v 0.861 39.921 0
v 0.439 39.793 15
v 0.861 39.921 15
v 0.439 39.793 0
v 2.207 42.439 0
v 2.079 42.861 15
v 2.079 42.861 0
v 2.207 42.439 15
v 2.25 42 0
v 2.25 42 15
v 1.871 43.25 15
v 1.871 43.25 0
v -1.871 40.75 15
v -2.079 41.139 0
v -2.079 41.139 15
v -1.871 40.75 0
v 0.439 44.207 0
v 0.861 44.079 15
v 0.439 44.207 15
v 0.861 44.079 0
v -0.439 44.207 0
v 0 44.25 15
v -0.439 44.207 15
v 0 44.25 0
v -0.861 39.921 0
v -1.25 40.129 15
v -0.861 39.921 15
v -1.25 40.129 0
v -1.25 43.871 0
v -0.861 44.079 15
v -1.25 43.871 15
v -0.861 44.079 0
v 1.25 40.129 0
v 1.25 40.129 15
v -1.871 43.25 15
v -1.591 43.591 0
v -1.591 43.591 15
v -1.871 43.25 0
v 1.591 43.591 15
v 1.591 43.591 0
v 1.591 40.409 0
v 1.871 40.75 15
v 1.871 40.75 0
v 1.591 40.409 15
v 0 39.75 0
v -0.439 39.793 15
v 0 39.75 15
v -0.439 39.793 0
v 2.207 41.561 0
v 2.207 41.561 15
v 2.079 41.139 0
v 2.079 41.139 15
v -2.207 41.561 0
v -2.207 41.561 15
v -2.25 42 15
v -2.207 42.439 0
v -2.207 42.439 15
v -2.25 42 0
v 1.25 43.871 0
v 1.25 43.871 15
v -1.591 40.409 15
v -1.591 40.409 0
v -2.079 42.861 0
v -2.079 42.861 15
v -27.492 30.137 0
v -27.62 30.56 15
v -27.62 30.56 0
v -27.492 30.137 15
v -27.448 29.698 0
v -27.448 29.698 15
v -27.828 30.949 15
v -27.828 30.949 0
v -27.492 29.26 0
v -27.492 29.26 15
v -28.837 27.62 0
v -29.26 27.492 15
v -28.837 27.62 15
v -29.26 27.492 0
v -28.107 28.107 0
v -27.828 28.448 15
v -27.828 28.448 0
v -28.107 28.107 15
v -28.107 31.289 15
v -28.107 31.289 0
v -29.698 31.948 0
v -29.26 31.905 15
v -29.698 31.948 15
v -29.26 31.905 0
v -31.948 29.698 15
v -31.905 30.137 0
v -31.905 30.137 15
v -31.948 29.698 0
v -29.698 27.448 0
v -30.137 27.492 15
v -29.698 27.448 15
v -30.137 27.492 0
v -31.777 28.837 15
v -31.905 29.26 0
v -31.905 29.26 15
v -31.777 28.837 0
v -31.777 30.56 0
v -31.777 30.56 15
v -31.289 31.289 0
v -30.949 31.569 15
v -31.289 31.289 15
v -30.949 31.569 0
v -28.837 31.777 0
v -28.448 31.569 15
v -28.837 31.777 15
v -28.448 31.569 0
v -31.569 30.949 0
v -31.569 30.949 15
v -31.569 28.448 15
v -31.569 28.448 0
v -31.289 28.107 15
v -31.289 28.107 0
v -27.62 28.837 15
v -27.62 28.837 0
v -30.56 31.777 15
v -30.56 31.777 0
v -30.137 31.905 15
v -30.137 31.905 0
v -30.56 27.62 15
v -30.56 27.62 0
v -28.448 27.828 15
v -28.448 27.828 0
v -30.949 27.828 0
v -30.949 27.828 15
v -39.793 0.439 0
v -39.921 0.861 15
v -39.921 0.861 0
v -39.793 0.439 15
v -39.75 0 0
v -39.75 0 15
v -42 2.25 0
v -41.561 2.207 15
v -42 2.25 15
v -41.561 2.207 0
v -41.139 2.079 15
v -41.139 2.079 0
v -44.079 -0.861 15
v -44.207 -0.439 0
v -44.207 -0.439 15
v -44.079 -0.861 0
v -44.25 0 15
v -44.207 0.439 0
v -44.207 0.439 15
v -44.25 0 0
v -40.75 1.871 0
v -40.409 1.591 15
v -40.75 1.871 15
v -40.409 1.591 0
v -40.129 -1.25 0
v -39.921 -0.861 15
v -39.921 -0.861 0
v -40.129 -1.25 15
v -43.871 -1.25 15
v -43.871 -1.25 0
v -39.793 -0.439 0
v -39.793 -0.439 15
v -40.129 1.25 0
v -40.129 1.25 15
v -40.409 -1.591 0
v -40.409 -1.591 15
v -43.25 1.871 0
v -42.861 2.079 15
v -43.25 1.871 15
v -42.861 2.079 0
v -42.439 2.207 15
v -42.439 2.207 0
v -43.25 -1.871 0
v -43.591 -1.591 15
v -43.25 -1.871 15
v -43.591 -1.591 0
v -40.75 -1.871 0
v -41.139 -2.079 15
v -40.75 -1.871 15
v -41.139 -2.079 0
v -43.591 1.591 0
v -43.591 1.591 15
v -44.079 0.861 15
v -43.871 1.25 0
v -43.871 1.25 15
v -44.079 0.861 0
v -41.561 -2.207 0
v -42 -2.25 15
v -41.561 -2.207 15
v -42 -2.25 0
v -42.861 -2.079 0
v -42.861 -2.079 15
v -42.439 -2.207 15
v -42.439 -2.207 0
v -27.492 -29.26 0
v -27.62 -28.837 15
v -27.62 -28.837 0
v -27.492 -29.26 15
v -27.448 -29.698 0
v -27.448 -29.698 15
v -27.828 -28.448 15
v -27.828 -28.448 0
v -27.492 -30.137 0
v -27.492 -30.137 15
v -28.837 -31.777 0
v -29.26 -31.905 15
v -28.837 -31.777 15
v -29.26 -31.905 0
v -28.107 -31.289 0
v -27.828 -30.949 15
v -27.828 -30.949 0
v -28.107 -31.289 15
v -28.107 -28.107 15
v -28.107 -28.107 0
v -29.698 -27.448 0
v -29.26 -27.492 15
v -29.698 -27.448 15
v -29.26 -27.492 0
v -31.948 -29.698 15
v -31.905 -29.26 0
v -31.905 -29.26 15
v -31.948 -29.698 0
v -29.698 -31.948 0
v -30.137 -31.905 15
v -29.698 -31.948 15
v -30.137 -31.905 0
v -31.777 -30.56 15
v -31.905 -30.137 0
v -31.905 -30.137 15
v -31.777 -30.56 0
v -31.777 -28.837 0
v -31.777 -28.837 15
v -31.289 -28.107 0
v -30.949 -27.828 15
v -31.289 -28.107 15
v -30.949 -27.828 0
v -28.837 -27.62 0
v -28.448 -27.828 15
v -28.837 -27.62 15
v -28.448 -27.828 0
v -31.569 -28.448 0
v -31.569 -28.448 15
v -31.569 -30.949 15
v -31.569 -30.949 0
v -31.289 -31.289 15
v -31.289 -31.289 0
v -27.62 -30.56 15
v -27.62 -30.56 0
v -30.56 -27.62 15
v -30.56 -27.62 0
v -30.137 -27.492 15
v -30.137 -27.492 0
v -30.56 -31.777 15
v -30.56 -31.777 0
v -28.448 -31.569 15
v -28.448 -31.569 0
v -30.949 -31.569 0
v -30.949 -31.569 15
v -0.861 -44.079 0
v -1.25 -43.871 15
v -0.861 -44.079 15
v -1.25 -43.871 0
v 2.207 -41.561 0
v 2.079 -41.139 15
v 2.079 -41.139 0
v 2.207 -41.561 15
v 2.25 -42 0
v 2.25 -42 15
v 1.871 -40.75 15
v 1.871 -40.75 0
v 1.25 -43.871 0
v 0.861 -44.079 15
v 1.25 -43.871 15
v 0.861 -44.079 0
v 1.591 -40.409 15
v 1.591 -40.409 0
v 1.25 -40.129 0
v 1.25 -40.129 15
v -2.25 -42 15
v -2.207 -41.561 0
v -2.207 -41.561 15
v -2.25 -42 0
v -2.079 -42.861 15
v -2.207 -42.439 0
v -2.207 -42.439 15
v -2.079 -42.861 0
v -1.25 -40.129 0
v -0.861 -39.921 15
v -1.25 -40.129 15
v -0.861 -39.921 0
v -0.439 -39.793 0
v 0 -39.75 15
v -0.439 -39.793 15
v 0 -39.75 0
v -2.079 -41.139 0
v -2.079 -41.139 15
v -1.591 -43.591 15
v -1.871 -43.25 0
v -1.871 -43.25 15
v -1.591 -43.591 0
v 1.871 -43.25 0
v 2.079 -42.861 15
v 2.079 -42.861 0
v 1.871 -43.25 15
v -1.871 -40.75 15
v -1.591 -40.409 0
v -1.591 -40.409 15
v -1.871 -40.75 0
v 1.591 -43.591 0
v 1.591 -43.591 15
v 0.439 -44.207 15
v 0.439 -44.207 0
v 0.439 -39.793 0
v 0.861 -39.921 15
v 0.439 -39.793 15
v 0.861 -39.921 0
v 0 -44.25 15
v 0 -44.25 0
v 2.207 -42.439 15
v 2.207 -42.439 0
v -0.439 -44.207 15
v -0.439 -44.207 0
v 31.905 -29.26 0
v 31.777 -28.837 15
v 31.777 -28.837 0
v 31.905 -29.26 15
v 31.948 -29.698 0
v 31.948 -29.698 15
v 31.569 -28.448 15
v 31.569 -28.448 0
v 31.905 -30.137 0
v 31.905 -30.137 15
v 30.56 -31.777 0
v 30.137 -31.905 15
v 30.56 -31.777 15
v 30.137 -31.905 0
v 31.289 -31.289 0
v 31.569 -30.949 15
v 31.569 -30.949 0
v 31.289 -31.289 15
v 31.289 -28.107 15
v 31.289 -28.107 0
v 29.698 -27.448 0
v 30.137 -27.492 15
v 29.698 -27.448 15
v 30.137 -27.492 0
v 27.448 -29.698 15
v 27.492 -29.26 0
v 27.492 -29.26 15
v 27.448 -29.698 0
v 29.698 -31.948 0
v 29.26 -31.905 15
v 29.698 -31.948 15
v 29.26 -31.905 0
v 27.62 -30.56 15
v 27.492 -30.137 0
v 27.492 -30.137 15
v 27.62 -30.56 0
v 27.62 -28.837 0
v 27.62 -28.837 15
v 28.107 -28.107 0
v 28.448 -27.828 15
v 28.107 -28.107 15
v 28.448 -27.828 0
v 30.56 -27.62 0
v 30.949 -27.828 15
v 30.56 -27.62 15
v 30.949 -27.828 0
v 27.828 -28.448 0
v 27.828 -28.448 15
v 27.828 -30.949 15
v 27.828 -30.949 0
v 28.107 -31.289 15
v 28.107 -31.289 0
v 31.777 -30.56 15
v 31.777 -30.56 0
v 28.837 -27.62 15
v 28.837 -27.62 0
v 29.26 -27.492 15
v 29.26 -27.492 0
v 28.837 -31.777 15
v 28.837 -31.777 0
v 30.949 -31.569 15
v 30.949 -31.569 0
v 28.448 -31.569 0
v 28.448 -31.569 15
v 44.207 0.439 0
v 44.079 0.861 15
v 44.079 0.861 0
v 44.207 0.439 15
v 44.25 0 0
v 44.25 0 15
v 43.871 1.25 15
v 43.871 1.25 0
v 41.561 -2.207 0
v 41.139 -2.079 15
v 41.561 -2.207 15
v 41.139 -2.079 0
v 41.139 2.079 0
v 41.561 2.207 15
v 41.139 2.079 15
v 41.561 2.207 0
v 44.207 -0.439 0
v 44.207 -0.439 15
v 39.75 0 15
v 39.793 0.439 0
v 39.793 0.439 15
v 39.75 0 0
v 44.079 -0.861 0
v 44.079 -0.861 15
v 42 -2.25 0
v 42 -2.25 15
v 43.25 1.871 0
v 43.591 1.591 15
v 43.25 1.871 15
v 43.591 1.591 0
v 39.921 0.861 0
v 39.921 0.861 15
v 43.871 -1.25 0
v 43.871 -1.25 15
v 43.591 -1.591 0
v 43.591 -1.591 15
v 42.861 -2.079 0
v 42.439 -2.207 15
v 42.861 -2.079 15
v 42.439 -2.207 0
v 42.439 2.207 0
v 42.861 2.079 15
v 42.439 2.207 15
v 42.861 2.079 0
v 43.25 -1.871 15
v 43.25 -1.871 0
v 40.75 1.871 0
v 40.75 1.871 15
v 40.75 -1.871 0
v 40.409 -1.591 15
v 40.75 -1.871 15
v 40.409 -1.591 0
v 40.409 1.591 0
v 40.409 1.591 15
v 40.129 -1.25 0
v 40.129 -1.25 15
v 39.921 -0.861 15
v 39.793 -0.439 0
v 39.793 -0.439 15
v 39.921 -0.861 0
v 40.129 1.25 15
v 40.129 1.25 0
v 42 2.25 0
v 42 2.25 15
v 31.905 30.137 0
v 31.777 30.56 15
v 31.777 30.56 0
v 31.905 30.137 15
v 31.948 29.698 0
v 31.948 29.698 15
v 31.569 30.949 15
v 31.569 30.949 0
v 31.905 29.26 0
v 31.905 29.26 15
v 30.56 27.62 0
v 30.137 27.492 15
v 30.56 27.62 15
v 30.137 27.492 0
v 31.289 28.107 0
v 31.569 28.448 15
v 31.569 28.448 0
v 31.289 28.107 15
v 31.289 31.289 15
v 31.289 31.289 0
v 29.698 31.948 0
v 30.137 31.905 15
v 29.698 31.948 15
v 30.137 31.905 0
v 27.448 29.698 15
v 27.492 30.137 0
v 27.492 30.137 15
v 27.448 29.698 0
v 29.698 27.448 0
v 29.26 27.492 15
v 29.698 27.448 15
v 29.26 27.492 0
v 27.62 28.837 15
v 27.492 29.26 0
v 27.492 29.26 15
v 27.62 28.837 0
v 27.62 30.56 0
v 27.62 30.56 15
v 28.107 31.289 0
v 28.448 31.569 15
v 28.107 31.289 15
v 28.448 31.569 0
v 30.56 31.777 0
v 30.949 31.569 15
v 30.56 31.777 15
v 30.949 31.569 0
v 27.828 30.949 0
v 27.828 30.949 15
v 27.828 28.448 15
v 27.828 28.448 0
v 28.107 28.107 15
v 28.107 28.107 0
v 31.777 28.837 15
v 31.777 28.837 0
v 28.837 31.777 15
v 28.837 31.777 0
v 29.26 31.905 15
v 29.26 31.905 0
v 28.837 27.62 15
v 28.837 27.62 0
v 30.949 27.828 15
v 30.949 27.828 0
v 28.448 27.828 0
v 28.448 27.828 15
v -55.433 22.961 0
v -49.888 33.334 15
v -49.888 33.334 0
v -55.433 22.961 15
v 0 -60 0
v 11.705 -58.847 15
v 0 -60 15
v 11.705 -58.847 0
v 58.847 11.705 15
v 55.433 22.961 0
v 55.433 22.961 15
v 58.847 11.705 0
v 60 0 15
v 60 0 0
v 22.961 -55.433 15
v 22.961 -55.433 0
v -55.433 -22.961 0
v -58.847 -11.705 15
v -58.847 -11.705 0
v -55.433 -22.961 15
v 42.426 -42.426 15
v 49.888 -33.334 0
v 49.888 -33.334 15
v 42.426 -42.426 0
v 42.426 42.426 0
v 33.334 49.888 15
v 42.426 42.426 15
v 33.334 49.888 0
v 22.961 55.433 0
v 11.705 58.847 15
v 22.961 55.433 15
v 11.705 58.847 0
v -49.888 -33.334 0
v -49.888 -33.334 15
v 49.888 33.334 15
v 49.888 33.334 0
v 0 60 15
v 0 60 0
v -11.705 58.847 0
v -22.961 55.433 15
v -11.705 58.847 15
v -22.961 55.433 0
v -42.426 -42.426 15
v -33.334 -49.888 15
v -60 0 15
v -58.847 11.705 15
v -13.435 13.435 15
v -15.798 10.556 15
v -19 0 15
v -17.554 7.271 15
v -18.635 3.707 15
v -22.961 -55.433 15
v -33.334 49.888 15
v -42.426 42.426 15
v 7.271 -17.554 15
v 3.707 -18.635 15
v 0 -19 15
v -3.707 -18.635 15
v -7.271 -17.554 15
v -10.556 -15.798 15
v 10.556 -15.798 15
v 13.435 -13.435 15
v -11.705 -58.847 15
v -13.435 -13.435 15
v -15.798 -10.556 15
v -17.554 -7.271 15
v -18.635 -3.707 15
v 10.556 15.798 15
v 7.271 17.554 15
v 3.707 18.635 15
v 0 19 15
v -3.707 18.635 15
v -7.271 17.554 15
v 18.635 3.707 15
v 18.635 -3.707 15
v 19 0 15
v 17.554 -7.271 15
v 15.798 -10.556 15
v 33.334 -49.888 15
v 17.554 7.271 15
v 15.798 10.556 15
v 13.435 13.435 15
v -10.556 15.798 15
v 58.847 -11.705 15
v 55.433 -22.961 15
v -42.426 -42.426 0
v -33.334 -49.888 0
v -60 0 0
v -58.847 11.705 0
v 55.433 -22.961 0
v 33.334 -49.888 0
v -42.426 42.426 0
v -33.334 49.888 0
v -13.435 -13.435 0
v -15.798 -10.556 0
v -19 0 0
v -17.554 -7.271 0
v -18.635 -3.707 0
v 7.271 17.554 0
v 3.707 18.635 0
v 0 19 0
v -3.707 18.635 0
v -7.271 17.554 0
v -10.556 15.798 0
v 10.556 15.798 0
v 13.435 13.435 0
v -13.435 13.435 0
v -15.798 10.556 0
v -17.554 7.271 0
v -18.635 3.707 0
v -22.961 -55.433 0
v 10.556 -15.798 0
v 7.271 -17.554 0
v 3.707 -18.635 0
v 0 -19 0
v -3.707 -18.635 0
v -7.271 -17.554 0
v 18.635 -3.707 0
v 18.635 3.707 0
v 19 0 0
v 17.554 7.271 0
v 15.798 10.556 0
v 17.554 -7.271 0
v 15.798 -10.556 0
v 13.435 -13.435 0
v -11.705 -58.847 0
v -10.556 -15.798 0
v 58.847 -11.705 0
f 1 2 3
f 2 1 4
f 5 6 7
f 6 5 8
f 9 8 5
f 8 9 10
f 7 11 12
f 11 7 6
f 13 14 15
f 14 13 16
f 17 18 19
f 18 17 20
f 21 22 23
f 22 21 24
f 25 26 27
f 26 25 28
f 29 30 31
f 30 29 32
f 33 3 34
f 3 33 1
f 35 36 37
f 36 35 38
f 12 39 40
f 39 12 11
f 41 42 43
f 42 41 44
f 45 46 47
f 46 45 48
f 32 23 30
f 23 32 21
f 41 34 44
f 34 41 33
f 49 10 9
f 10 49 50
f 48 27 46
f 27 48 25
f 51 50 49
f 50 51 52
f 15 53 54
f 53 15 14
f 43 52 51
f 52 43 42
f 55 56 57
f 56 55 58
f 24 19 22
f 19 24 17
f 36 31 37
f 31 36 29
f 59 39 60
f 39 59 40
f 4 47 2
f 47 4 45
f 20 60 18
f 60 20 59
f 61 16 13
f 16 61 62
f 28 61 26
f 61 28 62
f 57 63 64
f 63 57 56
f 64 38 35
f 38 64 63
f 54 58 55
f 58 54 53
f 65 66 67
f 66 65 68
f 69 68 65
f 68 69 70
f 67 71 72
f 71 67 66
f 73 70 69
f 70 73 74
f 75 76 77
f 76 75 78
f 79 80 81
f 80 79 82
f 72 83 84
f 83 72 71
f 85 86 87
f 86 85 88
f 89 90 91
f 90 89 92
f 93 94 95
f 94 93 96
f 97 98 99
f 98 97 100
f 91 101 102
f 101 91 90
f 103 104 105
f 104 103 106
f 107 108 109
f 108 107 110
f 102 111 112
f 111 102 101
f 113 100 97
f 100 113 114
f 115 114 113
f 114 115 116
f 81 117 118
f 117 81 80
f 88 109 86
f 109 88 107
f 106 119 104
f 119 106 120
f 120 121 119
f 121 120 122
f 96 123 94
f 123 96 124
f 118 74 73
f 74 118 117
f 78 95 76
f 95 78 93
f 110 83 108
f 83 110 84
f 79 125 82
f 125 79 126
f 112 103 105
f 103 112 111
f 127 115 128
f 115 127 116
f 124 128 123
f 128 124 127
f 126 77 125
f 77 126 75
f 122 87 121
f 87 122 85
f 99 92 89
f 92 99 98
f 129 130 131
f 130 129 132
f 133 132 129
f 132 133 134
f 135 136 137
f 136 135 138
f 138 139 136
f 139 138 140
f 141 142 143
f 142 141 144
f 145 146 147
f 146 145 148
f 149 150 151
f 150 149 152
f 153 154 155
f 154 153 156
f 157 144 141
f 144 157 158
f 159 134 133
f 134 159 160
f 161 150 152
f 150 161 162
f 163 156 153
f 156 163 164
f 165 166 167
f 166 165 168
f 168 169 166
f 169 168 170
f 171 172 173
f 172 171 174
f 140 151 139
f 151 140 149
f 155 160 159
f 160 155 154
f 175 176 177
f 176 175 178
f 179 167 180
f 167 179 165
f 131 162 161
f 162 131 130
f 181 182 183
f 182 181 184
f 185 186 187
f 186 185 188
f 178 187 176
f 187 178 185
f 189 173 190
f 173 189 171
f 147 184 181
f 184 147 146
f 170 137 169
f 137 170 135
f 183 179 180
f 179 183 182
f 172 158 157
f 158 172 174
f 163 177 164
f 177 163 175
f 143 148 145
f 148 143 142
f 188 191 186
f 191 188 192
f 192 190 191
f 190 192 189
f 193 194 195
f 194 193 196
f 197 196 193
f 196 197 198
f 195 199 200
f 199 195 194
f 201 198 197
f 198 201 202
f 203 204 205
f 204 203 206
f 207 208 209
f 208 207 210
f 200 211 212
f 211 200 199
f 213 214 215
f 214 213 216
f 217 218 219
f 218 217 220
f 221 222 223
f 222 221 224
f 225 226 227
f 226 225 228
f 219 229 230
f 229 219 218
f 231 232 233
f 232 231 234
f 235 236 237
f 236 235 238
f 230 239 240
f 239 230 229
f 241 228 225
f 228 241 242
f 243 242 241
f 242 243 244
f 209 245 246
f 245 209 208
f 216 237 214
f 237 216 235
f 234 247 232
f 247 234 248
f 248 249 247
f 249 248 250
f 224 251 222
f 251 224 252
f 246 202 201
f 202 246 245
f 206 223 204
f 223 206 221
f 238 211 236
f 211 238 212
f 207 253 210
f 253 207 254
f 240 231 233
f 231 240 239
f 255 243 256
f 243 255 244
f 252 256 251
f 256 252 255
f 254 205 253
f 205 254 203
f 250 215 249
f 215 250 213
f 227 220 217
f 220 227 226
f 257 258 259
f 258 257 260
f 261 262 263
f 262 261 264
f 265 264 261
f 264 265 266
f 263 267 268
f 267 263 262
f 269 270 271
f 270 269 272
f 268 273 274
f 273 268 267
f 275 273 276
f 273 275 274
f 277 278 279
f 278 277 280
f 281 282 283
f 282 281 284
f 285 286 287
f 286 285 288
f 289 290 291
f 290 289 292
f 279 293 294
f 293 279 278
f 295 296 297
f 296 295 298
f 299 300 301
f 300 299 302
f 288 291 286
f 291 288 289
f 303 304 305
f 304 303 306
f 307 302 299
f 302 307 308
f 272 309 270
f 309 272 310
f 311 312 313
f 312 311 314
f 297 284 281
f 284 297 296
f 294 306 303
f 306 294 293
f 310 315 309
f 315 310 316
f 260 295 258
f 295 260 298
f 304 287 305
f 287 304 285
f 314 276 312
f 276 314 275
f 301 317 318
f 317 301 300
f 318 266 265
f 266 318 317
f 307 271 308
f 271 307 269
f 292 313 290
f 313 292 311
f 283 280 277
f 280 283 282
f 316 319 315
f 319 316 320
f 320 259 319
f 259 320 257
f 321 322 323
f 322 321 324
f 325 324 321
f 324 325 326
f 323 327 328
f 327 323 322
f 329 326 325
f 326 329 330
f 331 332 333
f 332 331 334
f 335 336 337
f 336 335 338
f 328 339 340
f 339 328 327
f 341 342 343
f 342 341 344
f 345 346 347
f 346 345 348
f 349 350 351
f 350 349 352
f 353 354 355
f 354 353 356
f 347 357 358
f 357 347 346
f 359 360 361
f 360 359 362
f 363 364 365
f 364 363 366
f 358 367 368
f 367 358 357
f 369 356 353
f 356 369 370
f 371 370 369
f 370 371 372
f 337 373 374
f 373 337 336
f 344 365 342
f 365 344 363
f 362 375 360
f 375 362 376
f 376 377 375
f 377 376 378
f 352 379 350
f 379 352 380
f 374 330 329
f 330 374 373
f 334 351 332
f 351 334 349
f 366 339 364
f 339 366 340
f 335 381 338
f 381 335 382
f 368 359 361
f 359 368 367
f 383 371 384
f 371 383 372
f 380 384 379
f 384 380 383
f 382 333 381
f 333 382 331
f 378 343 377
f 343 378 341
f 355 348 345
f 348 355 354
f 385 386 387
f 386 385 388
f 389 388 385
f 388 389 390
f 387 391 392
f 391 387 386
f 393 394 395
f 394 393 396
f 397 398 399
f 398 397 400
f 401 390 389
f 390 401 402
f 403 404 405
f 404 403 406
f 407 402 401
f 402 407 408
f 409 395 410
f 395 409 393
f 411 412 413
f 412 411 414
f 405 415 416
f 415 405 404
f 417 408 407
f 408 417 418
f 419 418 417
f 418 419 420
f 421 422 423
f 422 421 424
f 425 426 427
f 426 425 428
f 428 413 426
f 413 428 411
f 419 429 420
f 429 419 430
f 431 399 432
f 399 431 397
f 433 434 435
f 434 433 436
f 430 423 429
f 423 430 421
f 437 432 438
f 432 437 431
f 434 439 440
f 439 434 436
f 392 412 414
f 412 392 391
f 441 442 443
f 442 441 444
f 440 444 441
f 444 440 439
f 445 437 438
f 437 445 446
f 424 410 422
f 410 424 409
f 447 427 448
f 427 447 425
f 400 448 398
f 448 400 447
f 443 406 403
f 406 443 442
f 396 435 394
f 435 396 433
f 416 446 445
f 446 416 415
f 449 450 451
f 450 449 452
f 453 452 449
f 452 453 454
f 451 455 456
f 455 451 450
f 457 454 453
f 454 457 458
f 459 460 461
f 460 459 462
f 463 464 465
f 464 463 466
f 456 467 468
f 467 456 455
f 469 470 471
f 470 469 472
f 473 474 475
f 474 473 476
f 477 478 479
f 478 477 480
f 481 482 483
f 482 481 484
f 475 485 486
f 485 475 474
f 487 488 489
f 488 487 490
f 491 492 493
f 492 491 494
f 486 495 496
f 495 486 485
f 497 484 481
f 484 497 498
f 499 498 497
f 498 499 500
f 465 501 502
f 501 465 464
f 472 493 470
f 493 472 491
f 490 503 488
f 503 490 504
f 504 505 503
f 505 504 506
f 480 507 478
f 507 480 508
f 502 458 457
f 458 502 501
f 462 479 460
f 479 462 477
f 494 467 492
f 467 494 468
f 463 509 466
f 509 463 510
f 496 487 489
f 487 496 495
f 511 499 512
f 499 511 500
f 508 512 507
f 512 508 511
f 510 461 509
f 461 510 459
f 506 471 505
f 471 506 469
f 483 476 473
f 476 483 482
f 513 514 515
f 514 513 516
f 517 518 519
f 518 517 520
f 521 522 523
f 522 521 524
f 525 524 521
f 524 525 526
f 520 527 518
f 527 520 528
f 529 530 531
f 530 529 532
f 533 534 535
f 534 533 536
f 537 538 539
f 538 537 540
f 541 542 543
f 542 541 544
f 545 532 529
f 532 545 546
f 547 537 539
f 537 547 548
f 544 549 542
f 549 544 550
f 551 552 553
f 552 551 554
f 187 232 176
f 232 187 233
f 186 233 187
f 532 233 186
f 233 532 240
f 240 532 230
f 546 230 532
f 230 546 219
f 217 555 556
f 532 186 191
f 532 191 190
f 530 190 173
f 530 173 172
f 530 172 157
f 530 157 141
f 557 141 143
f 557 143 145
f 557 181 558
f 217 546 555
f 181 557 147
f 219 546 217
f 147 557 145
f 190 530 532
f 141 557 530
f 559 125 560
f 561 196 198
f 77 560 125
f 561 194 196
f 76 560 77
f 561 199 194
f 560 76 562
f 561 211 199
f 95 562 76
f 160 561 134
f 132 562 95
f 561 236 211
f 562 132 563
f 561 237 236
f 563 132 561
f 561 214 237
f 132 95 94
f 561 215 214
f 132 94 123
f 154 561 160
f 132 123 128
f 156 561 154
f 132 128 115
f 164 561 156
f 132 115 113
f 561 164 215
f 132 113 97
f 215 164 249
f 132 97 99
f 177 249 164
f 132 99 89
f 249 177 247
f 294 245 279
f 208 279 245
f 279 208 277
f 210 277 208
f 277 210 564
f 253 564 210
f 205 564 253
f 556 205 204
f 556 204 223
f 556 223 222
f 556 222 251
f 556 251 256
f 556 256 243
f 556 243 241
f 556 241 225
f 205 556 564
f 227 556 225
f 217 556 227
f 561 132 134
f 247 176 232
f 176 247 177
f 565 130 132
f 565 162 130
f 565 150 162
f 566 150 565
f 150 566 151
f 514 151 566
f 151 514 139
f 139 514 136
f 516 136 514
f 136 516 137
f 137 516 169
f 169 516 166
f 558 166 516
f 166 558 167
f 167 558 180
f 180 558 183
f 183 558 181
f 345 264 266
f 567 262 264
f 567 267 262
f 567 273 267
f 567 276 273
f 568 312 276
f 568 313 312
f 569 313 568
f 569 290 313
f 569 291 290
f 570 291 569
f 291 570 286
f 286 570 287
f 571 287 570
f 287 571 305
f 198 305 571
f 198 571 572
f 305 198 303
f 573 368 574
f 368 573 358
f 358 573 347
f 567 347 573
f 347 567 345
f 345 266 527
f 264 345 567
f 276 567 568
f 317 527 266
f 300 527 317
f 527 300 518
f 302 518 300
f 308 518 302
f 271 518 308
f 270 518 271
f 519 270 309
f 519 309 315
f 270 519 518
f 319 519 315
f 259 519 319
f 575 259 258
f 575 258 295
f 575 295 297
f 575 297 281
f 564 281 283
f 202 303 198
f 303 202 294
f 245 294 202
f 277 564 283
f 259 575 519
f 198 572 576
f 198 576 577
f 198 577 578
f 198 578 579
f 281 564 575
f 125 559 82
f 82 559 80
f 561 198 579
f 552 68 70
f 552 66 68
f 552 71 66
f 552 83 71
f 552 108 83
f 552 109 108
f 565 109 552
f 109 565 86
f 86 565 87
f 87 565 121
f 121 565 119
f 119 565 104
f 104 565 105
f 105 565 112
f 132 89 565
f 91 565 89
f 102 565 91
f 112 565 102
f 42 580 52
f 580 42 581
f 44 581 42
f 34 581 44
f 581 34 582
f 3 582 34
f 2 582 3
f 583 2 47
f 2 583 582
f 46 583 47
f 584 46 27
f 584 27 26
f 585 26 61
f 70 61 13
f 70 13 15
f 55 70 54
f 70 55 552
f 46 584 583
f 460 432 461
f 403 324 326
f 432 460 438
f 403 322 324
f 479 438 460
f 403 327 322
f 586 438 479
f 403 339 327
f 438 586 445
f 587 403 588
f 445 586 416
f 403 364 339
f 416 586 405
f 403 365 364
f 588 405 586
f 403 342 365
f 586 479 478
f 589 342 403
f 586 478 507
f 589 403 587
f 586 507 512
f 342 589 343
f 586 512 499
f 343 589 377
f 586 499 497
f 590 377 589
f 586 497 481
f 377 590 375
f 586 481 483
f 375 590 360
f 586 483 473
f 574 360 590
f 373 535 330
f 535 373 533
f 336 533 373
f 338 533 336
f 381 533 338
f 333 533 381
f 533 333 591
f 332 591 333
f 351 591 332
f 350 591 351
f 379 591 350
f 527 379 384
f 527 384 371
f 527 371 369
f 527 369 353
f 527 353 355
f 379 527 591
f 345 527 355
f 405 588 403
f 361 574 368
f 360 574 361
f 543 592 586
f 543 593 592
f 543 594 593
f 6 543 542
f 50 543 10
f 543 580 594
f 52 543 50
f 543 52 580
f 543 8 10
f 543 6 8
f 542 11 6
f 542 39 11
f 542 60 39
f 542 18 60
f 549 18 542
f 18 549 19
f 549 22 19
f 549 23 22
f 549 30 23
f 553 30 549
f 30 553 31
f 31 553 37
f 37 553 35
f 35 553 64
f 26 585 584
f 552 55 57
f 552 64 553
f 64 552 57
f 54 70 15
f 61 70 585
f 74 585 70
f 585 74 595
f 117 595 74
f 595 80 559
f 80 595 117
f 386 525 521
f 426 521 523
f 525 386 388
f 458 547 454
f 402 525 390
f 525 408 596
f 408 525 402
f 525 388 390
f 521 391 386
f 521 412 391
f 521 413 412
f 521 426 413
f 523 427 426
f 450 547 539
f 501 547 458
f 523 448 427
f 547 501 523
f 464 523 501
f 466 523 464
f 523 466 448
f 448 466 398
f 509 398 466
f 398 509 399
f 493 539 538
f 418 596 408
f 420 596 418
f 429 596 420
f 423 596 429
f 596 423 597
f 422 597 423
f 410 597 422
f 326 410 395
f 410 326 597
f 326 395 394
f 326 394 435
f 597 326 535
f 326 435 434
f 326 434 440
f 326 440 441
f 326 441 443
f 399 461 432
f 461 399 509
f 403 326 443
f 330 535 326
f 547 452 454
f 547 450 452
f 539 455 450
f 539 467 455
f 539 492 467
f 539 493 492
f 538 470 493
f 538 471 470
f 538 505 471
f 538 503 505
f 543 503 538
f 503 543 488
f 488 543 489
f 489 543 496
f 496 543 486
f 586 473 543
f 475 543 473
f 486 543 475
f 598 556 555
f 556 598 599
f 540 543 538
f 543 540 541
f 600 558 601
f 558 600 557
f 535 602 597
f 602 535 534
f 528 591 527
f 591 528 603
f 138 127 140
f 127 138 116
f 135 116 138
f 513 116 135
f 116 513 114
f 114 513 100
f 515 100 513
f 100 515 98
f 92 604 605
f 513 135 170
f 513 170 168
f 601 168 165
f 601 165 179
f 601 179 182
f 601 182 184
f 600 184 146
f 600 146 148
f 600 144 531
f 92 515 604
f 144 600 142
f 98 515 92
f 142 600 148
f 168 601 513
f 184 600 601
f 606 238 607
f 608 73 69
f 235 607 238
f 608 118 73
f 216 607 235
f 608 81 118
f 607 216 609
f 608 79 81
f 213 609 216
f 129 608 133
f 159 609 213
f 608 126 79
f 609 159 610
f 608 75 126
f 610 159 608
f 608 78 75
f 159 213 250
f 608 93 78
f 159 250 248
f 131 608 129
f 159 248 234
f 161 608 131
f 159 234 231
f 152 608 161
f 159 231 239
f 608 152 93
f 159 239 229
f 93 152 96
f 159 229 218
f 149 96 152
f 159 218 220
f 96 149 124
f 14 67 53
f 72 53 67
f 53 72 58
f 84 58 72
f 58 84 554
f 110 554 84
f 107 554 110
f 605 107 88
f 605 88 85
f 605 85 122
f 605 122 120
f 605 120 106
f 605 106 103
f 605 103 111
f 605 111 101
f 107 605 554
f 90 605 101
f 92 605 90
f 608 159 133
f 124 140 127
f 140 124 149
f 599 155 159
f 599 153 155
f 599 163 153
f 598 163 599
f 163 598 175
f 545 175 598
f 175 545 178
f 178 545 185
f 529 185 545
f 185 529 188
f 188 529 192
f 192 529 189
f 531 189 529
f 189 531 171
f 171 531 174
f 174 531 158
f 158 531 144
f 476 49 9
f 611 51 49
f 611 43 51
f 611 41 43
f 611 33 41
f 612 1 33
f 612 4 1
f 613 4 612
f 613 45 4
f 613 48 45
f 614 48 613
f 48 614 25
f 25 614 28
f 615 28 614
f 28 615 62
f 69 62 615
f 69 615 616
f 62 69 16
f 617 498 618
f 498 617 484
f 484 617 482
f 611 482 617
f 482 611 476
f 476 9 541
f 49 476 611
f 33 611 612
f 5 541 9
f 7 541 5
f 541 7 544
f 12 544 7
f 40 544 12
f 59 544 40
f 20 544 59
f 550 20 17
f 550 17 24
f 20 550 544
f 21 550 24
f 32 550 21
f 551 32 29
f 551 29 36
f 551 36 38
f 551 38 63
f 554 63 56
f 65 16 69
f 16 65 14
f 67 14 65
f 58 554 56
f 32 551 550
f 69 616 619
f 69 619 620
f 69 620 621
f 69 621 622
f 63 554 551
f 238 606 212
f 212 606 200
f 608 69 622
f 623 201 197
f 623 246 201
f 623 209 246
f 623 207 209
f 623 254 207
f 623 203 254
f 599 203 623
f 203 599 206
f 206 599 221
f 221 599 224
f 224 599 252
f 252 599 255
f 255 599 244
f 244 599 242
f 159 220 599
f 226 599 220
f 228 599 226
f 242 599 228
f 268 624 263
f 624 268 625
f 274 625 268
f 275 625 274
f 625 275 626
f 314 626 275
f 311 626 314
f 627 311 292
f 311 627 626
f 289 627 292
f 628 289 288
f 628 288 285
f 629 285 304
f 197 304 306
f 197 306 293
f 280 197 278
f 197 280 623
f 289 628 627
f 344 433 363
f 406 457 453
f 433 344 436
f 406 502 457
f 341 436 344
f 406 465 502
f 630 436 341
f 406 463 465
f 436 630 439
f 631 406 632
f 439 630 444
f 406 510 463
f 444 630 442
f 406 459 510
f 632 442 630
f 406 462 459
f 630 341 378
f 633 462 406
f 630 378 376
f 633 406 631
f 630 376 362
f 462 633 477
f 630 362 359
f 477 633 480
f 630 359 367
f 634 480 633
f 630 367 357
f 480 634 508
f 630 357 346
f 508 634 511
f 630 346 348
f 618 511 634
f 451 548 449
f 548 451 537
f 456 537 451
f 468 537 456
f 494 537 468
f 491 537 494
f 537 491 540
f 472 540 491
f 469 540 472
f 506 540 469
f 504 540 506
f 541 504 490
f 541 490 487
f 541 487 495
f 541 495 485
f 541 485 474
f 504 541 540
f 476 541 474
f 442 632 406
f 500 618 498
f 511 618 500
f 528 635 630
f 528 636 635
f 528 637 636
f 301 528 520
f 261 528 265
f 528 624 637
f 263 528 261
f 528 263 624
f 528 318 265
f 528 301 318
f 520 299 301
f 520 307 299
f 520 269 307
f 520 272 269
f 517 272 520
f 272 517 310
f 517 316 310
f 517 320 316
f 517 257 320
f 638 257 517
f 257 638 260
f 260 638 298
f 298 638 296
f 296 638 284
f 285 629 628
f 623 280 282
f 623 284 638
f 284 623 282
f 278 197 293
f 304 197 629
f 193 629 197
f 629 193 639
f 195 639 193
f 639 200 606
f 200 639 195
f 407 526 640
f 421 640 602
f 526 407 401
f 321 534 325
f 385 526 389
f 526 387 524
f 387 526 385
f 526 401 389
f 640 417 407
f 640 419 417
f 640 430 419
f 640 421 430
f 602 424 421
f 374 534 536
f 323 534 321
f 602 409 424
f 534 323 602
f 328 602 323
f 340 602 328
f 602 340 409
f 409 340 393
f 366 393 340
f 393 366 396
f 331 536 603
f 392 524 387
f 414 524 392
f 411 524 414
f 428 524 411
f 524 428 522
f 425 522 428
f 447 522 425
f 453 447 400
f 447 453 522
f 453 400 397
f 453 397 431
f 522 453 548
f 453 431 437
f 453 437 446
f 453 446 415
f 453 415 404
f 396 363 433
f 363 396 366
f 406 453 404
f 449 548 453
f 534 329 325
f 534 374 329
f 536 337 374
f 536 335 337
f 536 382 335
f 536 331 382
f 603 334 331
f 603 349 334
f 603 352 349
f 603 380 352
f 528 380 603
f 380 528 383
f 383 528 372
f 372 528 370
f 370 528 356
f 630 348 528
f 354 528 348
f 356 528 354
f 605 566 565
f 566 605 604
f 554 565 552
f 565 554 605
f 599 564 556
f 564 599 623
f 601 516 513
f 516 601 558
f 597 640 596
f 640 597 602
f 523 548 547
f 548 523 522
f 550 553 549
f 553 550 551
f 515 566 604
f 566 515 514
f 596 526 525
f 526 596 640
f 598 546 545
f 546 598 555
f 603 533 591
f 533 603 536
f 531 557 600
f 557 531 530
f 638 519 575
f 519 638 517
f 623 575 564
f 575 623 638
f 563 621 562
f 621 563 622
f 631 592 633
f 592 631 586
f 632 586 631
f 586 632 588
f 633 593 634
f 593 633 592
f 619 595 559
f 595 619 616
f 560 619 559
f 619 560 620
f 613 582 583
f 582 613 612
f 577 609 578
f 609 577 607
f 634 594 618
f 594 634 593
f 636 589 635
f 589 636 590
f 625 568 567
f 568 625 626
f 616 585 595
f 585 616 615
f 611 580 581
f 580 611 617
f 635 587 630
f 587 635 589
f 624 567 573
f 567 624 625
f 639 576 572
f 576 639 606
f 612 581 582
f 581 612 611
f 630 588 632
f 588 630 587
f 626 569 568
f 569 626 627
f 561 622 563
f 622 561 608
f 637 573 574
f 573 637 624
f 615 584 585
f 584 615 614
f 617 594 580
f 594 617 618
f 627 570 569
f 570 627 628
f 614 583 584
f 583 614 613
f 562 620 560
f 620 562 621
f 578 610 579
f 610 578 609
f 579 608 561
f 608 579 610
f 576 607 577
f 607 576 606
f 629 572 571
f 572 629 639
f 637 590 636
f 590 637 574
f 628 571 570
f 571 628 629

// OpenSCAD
$fn = 32;

// ----------------------------------------------------------------------
// Flange Ø120 x 15
// 8 holes on a Ø84 bolt circle, bolted joints
// ----------------------------------------------------------------------

// --- parameters (mm) ---
flange_d = 120;  // outside diameter of the flange
thickness = 15;  // flange thickness
holes = 8;       // number of bolt holes
pcd = 84;        // bolt circle diameter
start_deg = 90;  // angle of the first hole, from +X
hole_d = 4.5;    // bolt hole diameter
bore_d = 38;     // central through bore
hub_d = 50;      // hub outside diameter
hub_h = 0;       // hub height above the flange face (0 = no hub)

// --- derived feature positions (mm) ---
height = thickness + hub_h;  // = 15   overall height of the part
pcd_r = pcd / 2;             // = 42   bolt circle radius
hole_step = 360 / holes;     // = 45   angular pitch
feature_centers = [
  [pcd_r * cos(start_deg + 0 * hole_step), pcd_r * sin(start_deg + 0 * hole_step)],
  [pcd_r * cos(start_deg + 1 * hole_step), pcd_r * sin(start_deg + 1 * hole_step)],
  [pcd_r * cos(start_deg + 2 * hole_step), pcd_r * sin(start_deg + 2 * hole_step)],
  [pcd_r * cos(start_deg + 3 * hole_step), pcd_r * sin(start_deg + 3 * hole_step)],
  [pcd_r * cos(start_deg + 4 * hole_step), pcd_r * sin(start_deg + 4 * hole_step)],
  [pcd_r * cos(start_deg + 5 * hole_step), pcd_r * sin(start_deg + 5 * hole_step)],
  [pcd_r * cos(start_deg + 6 * hole_step), pcd_r * sin(start_deg + 6 * hole_step)],
  [pcd_r * cos(start_deg + 7 * hole_step), pcd_r * sin(start_deg + 7 * hole_step)]
];   // bolt hole centres on the pitch circle

// flange disc, every hole and the bore cut straight through
difference() {
  union() {
    cylinder(d = flange_d, h = thickness);
  }
  translate([0, 0, -1]) cylinder(d = bore_d, h = height + 2);  // bore, through
  for (centre = feature_centers)
    translate([centre[0], centre[1], -1]) cylinder(d = hole_d, h = thickness + 2);
}
